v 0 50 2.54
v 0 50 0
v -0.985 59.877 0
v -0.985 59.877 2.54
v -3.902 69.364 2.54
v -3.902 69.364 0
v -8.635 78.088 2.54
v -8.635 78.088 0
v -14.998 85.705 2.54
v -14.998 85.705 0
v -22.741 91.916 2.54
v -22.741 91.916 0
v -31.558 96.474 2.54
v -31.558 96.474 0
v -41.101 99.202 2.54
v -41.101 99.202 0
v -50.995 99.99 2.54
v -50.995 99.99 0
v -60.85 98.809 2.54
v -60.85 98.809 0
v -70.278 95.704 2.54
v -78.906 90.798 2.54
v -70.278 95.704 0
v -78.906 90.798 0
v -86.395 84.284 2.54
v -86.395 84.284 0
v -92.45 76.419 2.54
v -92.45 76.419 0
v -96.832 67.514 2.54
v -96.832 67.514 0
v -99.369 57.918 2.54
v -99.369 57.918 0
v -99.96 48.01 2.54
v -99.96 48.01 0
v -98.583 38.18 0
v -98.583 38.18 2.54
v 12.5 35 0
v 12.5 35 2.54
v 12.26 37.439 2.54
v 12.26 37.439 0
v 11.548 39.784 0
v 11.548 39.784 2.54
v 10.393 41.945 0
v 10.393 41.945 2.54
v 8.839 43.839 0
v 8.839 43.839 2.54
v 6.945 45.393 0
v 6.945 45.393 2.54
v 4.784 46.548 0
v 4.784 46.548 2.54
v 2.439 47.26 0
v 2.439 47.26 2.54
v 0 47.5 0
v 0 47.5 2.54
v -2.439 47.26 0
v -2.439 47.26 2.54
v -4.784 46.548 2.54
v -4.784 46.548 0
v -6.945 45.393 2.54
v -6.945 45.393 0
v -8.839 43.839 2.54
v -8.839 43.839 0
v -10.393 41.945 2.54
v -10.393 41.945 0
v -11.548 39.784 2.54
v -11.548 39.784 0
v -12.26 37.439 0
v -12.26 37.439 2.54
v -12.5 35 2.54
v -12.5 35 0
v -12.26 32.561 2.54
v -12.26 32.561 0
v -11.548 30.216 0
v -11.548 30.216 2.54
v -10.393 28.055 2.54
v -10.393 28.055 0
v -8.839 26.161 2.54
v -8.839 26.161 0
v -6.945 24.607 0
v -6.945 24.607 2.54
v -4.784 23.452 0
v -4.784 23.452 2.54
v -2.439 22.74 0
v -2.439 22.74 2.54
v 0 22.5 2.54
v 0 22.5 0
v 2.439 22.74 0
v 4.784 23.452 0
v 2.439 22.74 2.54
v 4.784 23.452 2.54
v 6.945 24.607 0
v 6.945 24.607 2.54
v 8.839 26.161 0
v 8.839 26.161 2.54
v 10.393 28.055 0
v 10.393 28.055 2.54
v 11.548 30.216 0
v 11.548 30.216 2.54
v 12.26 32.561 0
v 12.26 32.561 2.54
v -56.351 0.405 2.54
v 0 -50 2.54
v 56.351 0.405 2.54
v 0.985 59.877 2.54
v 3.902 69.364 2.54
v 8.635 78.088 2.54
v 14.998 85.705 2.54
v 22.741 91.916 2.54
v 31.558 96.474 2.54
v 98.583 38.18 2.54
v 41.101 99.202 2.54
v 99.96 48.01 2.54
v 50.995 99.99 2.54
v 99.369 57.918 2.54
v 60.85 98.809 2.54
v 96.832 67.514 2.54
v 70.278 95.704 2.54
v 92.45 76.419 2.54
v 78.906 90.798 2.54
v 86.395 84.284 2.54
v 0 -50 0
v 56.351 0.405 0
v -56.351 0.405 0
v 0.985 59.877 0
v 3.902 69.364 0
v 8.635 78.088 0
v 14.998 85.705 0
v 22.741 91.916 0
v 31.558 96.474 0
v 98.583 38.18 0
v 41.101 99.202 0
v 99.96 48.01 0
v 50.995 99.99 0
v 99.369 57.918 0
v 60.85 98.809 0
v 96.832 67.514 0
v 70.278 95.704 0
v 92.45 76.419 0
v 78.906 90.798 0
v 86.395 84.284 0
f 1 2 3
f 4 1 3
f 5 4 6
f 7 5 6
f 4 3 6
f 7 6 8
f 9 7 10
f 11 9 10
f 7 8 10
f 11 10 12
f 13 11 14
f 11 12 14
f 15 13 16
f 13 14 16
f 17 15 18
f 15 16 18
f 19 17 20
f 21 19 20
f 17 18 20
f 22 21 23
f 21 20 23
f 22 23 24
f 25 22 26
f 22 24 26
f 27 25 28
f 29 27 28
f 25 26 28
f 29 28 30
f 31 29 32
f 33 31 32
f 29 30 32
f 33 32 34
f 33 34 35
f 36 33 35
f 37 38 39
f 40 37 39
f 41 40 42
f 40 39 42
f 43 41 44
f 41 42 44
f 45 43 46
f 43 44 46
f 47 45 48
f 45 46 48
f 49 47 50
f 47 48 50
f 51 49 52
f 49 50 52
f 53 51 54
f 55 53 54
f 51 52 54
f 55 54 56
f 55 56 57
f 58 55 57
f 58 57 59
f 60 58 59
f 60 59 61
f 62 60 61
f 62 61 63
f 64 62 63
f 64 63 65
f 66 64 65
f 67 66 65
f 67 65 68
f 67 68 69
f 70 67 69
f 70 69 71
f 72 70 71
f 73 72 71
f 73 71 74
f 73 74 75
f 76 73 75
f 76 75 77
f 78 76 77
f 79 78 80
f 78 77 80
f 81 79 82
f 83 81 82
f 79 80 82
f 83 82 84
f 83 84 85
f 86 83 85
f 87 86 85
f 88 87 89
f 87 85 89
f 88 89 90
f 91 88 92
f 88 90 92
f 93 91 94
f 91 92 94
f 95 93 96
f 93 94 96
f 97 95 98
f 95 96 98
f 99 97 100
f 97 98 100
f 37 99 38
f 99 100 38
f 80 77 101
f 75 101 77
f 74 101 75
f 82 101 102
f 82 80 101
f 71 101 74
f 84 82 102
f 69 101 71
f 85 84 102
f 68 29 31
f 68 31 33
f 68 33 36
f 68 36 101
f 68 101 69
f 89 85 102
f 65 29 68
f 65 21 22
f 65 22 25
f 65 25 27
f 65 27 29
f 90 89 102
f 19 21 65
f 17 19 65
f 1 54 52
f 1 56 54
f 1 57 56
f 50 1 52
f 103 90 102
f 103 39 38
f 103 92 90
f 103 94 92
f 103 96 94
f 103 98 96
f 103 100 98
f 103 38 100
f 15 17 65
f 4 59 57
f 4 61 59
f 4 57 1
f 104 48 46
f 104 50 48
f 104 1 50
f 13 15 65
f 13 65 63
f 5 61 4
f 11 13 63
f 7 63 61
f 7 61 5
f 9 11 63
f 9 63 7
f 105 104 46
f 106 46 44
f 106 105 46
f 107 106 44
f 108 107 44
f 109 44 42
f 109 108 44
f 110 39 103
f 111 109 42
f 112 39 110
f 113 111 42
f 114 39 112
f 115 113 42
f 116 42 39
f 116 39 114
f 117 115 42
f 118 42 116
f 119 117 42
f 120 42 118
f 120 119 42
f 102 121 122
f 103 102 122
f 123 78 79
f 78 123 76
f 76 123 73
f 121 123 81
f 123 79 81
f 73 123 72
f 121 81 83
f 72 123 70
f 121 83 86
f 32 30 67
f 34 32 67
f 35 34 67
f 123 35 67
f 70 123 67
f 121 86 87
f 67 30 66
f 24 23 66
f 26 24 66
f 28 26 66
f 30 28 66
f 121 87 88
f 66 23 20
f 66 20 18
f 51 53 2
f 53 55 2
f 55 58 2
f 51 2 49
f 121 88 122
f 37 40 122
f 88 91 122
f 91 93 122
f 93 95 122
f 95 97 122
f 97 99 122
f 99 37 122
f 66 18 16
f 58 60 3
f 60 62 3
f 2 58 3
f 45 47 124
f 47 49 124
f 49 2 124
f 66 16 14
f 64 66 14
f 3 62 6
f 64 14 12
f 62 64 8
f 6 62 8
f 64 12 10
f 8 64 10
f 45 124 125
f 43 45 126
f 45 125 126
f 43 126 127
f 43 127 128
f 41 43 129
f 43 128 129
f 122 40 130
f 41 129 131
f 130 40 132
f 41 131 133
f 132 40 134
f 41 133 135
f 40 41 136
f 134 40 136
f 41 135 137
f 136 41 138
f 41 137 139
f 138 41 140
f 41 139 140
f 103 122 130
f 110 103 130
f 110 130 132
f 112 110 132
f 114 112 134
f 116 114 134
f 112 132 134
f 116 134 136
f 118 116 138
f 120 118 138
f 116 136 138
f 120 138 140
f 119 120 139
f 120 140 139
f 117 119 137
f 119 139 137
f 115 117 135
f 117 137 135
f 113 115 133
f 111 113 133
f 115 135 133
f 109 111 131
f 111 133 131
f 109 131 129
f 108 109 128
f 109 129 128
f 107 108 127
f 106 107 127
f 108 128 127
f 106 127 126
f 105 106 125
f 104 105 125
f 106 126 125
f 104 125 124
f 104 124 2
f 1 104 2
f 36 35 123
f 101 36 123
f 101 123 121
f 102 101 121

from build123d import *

# Parameters (mm, degrees)
F1_DEPTH = 2.54
F2_R     = 12.5
F3_DEPTH = 25.4


with BuildPart() as f1:
    # F0 (on Top) → F1 (new body)
    with BuildSketch(Plane.XY):
        with BuildLine():
            ThreePointArc((98.582891, 38.180412), (55.952119, 99.644459), (0, 50))
            ThreePointArc((0, 50), (-55.952119, 99.644459), (-98.582891, 38.180412))
            Line((-98.582891, 38.180412), (-56.351205, 0.405018))
            Line((-56.351205, 0.405018), (0, -50))
            Line((0, -50), (56.351205, 0.405018))
            Line((56.351205, 0.405018), (98.582891, 38.180412))
        make_face()
    extrude(amount=F1_DEPTH)

    # F2 (on face) → F3 (cut)
    with BuildSketch(Plane.XY.offset(2.54)):
        with Locations((0, 35)):
            Circle(F2_R)
    extrude(amount=-F3_DEPTH, mode=Mode.SUBTRACT)


solid = f1.part
